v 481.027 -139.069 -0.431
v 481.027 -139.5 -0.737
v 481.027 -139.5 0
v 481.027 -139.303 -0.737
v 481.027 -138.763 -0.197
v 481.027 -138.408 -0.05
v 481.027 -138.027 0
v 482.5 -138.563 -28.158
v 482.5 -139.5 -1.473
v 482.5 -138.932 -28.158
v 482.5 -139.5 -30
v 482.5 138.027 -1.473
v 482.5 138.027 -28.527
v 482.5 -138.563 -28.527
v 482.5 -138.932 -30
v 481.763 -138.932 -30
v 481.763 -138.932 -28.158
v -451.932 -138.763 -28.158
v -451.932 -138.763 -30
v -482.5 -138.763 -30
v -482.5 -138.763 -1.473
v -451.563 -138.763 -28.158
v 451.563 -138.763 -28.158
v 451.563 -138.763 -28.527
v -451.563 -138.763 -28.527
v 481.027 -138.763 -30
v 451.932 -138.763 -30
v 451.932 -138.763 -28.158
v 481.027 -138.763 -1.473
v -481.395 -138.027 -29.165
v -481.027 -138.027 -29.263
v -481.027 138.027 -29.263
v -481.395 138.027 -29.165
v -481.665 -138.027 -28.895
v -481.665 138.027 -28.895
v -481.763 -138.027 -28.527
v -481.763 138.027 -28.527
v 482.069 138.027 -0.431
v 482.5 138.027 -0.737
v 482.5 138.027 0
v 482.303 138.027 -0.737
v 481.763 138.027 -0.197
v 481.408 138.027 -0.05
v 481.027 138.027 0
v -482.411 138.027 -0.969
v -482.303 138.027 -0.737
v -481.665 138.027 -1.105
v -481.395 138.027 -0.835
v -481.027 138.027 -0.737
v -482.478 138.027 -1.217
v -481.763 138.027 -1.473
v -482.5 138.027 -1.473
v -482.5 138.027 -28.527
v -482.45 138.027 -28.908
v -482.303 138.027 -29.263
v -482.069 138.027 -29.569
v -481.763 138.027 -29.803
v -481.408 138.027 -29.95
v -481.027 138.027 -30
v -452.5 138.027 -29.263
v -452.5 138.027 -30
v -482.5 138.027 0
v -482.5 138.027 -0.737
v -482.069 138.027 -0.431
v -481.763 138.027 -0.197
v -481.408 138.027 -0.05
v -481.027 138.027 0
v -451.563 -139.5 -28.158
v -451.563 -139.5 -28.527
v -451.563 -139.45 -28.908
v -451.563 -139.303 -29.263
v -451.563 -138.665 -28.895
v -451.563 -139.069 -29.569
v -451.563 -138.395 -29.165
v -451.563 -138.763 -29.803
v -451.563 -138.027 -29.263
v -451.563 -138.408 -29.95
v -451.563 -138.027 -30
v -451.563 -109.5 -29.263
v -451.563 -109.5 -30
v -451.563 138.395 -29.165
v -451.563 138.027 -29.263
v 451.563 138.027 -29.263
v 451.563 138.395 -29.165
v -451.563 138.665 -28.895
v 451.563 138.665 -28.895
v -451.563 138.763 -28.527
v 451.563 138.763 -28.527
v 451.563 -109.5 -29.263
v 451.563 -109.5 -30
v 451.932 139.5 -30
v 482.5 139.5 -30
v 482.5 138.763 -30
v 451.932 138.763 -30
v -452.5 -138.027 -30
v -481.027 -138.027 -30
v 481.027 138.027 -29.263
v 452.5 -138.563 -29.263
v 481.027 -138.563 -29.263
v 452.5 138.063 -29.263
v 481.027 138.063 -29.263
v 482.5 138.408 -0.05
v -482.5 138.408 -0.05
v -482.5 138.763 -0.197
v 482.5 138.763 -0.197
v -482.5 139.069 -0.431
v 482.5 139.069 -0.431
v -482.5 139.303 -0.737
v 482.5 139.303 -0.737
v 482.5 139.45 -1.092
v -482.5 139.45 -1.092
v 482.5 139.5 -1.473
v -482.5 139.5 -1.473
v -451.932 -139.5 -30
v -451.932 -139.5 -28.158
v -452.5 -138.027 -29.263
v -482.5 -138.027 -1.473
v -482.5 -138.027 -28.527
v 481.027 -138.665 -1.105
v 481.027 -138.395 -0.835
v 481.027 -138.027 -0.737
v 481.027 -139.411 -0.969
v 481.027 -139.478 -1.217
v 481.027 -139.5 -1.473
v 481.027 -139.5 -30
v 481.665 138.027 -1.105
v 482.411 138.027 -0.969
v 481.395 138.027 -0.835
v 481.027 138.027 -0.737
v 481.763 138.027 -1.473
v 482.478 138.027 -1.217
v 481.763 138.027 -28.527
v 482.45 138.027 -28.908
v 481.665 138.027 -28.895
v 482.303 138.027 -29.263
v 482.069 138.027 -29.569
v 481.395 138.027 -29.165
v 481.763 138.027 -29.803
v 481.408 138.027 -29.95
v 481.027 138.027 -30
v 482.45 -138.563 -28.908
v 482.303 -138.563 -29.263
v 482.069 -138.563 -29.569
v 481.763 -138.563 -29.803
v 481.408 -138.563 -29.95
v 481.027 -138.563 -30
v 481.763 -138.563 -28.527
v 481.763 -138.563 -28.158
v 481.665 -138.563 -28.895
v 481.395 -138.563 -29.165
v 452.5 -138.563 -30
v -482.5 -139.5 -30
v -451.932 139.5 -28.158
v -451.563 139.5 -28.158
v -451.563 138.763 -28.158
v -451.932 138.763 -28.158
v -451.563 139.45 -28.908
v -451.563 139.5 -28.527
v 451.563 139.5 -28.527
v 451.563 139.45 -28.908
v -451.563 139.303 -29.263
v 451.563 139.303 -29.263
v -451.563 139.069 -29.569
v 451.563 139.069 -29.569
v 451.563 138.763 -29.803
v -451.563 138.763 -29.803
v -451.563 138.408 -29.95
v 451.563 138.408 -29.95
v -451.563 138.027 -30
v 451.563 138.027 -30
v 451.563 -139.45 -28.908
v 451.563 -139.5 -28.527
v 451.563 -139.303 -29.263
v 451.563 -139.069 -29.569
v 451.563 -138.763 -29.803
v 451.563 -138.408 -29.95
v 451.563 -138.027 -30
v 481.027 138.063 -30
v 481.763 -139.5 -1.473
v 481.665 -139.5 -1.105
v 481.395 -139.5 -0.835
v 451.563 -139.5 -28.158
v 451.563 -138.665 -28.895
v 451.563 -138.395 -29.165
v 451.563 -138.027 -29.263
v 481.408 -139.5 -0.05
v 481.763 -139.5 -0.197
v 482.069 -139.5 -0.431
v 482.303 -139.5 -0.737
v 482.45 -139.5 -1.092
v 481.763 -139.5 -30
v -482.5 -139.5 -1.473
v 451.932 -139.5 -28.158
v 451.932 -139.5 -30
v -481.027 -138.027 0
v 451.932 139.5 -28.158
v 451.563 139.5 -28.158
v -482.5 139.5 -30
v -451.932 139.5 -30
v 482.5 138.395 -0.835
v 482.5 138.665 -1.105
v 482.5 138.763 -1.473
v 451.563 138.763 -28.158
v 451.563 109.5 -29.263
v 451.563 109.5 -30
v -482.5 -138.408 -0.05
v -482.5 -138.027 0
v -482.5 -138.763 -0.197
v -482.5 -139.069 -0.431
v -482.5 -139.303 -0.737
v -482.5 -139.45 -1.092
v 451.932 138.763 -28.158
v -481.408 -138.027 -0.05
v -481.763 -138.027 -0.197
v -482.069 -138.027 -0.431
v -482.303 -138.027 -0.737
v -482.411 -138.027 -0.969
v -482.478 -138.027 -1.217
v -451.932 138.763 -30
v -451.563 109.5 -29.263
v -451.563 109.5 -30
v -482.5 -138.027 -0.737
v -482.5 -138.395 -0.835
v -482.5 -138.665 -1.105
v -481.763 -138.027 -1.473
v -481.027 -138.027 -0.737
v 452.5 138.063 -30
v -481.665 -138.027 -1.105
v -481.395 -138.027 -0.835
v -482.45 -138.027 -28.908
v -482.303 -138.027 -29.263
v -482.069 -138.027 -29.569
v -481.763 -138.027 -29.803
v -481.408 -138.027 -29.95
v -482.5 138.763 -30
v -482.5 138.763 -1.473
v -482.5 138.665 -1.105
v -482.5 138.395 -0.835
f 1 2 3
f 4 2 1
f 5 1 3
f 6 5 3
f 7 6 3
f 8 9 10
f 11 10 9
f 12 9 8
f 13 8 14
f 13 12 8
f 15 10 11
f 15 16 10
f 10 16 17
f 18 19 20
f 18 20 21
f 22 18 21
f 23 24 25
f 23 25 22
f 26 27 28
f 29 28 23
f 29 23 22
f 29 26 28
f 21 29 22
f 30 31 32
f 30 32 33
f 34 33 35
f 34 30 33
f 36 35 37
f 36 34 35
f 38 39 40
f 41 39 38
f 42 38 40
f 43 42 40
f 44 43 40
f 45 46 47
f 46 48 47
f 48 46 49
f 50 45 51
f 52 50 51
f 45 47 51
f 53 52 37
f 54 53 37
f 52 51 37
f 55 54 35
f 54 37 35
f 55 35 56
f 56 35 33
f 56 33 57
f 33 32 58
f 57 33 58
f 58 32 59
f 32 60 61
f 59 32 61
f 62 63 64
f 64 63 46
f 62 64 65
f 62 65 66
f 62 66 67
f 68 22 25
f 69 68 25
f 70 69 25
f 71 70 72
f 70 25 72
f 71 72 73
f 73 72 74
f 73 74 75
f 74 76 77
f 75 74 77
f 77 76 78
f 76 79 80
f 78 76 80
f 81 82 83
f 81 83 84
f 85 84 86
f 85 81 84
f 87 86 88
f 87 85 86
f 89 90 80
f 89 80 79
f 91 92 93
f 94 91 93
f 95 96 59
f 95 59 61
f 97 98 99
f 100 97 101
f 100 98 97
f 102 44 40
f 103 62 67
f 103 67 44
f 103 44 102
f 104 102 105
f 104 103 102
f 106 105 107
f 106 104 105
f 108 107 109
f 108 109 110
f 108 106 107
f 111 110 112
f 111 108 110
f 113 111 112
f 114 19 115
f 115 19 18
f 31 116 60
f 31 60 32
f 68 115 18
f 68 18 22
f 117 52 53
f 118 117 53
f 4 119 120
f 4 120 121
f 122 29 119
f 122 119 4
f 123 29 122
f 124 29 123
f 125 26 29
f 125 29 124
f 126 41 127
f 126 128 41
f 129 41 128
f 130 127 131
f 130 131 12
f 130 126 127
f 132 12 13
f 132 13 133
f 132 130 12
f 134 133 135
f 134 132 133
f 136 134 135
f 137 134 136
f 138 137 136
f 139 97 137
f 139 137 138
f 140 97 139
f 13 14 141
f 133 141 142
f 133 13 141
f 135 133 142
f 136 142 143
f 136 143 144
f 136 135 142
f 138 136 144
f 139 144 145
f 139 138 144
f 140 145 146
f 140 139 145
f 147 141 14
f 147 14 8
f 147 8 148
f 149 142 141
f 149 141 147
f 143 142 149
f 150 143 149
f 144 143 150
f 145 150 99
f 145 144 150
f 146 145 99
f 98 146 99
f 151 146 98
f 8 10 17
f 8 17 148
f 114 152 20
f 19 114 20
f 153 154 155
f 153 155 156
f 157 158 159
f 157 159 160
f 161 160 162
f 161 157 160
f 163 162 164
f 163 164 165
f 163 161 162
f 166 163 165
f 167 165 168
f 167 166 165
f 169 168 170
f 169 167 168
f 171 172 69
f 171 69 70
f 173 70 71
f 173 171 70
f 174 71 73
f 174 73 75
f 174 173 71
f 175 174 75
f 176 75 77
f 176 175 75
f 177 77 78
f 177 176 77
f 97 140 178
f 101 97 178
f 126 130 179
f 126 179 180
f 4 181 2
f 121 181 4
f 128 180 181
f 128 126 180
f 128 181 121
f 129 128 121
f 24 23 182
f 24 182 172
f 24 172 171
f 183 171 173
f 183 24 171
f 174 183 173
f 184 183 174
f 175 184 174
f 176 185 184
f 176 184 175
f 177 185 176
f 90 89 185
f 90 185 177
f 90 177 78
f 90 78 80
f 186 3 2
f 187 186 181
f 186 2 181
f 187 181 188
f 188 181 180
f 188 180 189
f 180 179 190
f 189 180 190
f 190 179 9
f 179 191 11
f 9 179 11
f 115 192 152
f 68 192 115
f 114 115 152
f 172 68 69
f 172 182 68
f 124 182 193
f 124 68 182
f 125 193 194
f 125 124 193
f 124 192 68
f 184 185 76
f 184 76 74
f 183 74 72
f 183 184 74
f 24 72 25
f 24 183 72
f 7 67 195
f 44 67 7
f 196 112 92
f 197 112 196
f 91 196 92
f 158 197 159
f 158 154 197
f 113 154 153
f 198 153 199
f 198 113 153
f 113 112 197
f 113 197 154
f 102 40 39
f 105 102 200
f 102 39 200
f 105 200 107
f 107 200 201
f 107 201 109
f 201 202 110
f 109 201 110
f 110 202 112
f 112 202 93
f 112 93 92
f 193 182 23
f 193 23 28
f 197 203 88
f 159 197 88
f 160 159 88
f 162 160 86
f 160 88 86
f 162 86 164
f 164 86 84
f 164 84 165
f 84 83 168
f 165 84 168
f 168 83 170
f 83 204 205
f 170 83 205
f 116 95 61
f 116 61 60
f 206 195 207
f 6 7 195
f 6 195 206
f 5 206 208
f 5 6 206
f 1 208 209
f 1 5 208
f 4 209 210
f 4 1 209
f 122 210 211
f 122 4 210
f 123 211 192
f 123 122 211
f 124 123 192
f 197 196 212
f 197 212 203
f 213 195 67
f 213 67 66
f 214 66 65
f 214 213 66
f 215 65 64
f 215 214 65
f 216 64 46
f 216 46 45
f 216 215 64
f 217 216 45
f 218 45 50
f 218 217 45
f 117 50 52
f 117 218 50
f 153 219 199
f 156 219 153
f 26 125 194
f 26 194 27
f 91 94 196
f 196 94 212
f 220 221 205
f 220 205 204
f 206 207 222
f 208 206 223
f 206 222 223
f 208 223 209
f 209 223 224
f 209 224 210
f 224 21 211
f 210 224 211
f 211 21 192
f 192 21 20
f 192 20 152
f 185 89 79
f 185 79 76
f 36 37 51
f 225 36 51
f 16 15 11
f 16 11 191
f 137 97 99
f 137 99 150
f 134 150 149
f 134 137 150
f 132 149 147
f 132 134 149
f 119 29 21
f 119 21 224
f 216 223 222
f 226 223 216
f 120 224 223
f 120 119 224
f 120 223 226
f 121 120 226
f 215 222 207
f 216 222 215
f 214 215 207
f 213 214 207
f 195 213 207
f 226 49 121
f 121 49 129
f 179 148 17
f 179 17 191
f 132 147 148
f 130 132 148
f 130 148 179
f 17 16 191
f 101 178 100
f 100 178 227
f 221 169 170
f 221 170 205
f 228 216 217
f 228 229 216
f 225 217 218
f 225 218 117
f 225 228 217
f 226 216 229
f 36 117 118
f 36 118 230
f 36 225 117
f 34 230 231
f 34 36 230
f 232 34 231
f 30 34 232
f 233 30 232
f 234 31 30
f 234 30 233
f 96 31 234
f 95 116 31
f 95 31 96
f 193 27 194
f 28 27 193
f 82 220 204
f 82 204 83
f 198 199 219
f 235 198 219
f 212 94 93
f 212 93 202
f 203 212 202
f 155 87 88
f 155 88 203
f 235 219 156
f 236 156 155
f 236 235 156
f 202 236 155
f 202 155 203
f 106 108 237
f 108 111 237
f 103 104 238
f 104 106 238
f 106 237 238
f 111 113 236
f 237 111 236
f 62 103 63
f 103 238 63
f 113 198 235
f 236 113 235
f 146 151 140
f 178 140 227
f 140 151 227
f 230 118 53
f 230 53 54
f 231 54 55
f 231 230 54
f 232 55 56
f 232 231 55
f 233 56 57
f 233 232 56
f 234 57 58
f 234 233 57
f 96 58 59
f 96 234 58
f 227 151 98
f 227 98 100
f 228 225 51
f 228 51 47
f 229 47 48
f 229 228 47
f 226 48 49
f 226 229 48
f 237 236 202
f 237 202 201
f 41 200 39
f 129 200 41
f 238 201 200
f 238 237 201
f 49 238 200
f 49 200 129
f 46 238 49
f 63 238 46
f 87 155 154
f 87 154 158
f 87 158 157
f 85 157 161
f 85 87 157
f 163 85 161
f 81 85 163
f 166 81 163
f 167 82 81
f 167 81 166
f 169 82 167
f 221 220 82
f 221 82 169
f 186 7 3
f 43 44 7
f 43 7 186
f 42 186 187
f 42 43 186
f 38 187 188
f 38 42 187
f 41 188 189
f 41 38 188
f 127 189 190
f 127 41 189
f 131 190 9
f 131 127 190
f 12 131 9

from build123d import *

# Parameters (mm, degrees)
SKETCH1_W                     = 965
SKETCH1_H                     = 279
BASE_FLANGE1_DEPTH            = 0.7366
EDGE_FLANGE1_STRIP_W          = 4.4196
EDGE_FLANGE1_STRIP_H          = 0.7366
EDGE_FLANGE1_STRIP_CUT_DEPTH  = 965
EDGE_FLANGE1_DEPTH            = 965
EDGE_FLANGE2_STRIP_W          = 4.4196
EDGE_FLANGE2_STRIP_H          = 0.7366
EDGE_FLANGE2_STRIP_CUT_DEPTH  = 277.5268
EDGE_FLANGE2_DEPTH            = 277.5268
EDGE_FLANGE3_STRIP_W          = 4.4196
EDGE_FLANGE3_STRIP_H          = 0.7366
EDGE_FLANGE3_STRIP_CUT_DEPTH  = 963.5268
EDGE_FLANGE3_DEPTH            = 963.5268
EDGE_FLANGE4_STRIP_W          = 4.4196
EDGE_FLANGE4_STRIP_H          = 0.7366
EDGE_FLANGE4_STRIP_CUT_DEPTH  = 276.0536
EDGE_FLANGE4_DEPTH            = 276.0536
EDGE_FLANGE5_STRIP_W          = 4.4196
EDGE_FLANGE5_STRIP_H          = 0.7366
EDGE_FLANGE5_STRIP_CUT_DEPTH  = 903.1268
EDGE_FLANGE5_RELIEF_W         = 4.7879
EDGE_FLANGE5_RELIEF_H         = 0.3683
EDGE_FLANGE5_RELIEF_CUT_DEPTH = 0.7366
EDGE_FLANGE5_DEPTH            = 903.1268
EDGE_FLANGE6_STRIP_W          = 4.4196
EDGE_FLANGE6_STRIP_H          = 0.7366
EDGE_FLANGE6_STRIP_CUT_DEPTH  = 903.1268
EDGE_FLANGE6_RELIEF_W         = 4.7879
EDGE_FLANGE6_RELIEF_H         = 0.3683
EDGE_FLANGE6_RELIEF_CUT_DEPTH = 0.7366
EDGE_FLANGE6_DEPTH            = 903.1268
EDGE_FLANGE7_STRIP_W          = 4.4196
EDGE_FLANGE7_STRIP_H          = 0.7366
EDGE_FLANGE7_STRIP_CUT_DEPTH  = 276.5902
EDGE_FLANGE7_RELIEF_W         = 4.7879
EDGE_FLANGE7_RELIEF_H         = 0.3683
EDGE_FLANGE7_RELIEF_CUT_DEPTH = 0.7366
EDGE_FLANGE7_DEPTH            = 276.5902
EDGE_FLANGE7_PROFILE_W        = 276.6268
EDGE_FLANGE7_PROFILE_H        = 28.5268
EDGE_FLANGE7_FLAT_DEPTH       = 0.7366
EDGE_FLANGE8_STRIP_W          = 4.4196
EDGE_FLANGE8_STRIP_H          = 0.7366
EDGE_FLANGE8_STRIP_CUT_DEPTH  = 276.0536
EDGE_FLANGE8_DEPTH            = 276.0536


# Sheet-metal steps are written as plain solids
with BuildPart() as part:
    # Sketch1 → Base-Flange1 (new body)
    with BuildSketch(Plane.XY):
        Rectangle(SKETCH1_W, SKETCH1_H)
    extrude(amount=-BASE_FLANGE1_DEPTH)

    # Edge-Flange1 strip (across the edge) → Edge-Flange1 strip cut (cut)
    with BuildSketch(Plane(origin=(-482.5, 139.5, -0.7366), x_dir=(0, -1, 0), z_dir=(1, 0, 0))):
        with Locations((-0.7366, -0.3683)):
            Rectangle(EDGE_FLANGE1_STRIP_W, EDGE_FLANGE1_STRIP_H)
    extrude(amount=EDGE_FLANGE1_STRIP_CUT_DEPTH, mode=Mode.SUBTRACT)

    # Edge-Flange1 section (across the edge) → Edge-Flange1 (add)
    with BuildSketch(Plane(origin=(-482.5, 139.5, -0.7366), x_dir=(0, -1, 0), z_dir=(1, 0, 0))):
        with BuildLine():
            Line((0, 0.7366), (0, 29.2634))
            Line((0, 29.2634), (0.7366, 29.2634))
            Line((0.7366, 29.2634), (0.7366, 0.7366))
            ThreePointArc((0.7366, 0.7366), (0.952345145, 0.215745145), (1.4732, 0))
            Line((1.4732, 0), (1.4732, -0.7366))
            ThreePointArc((1.4732, -0.7366), (0.43149029, -0.30510971), (0, 0.7366))
        make_face()
    extrude(amount=EDGE_FLANGE1_DEPTH)

    # Edge-Flange2 strip (across the edge) → Edge-Flange2 strip cut (cut)
    with BuildSketch(Plane(origin=(482.5, 138.0268, -0.7366), x_dir=(-1, 0, 0), z_dir=(0, -1, 0))):
        with Locations((-0.7366, -0.3683)):
            Rectangle(EDGE_FLANGE2_STRIP_W, EDGE_FLANGE2_STRIP_H)
    extrude(amount=EDGE_FLANGE2_STRIP_CUT_DEPTH, mode=Mode.SUBTRACT)

    # Edge-Flange2 section (across the edge) → Edge-Flange2 (add)
    with BuildSketch(Plane(origin=(482.5, 138.0268, -0.7366), x_dir=(-1, 0, 0), z_dir=(0, -1, 0))):
        with BuildLine():
            Line((0, 0.7366), (0, 29.2634))
            Line((0, 29.2634), (0.7366, 29.2634))
            Line((0.7366, 29.2634), (0.7366, 0.7366))
            ThreePointArc((0.7366, 0.7366), (0.952345145, 0.215745145), (1.4732, 0))
            Line((1.4732, 0), (1.4732, -0.7366))
            ThreePointArc((1.4732, -0.7366), (0.43149029, -0.30510971), (0, 0.7366))
        make_face()
    extrude(amount=EDGE_FLANGE2_DEPTH)

    # Edge-Flange3 strip (across the edge) → Edge-Flange3 strip cut (cut)
    with BuildSketch(Plane(origin=(481.0268, -139.5, -0.7366), x_dir=(0, 1, 0), z_dir=(-1, 0, 0))):
        with Locations((-0.7366, -0.3683)):
            Rectangle(EDGE_FLANGE3_STRIP_W, EDGE_FLANGE3_STRIP_H)
    extrude(amount=EDGE_FLANGE3_STRIP_CUT_DEPTH, mode=Mode.SUBTRACT)

    # Edge-Flange3 section (across the edge) → Edge-Flange3 (add)
    with BuildSketch(Plane(origin=(481.0268, -139.5, -0.7366), x_dir=(0, 1, 0), z_dir=(-1, 0, 0))):
        with BuildLine():
            Line((0, 0.7366), (0, 29.2634))
            Line((0, 29.2634), (0.7366, 29.2634))
            Line((0.7366, 29.2634), (0.7366, 0.7366))
            ThreePointArc((0.7366, 0.7366), (0.952345145, 0.215745145), (1.4732, 0))
            Line((1.4732, 0), (1.4732, -0.7366))
            ThreePointArc((1.4732, -0.7366), (0.43149029, -0.30510971), (0, 0.7366))
        make_face()
    extrude(amount=EDGE_FLANGE3_DEPTH)

    # Edge-Flange4 strip (across the edge) → Edge-Flange4 strip cut (cut)
    with BuildSketch(Plane(origin=(-482.5, -138.0268, -0.7366), x_dir=(1, 0, 0), z_dir=(0, 1, 0))):
        with Locations((-0.7366, -0.3683)):
            Rectangle(EDGE_FLANGE4_STRIP_W, EDGE_FLANGE4_STRIP_H)
    extrude(amount=EDGE_FLANGE4_STRIP_CUT_DEPTH, mode=Mode.SUBTRACT)

    # Edge-Flange4 section (across the edge) → Edge-Flange4 (add)
    with BuildSketch(Plane(origin=(-482.5, -138.0268, -0.7366), x_dir=(1, 0, 0), z_dir=(0, 1, 0))):
        with BuildLine():
            Line((0, 0.7366), (0, 29.2634))
            Line((0, 29.2634), (0.7366, 29.2634))
            Line((0.7366, 29.2634), (0.7366, 0.7366))
            ThreePointArc((0.7366, 0.7366), (0.952345145, 0.215745145), (1.4732, 0))
            Line((1.4732, 0), (1.4732, -0.7366))
            ThreePointArc((1.4732, -0.7366), (0.43149029, -0.30510971), (0, 0.7366))
        make_face()
    extrude(amount=EDGE_FLANGE4_DEPTH)

    # Edge-Flange5 strip (across the edge) → Edge-Flange5 strip cut (cut)
    with BuildSketch(Plane(origin=(451.5634, -138.7634, -30), x_dir=(0, 0, 1), z_dir=(-1, 0, 0))):
        with Locations((-0.7366, -0.3683)):
            Rectangle(EDGE_FLANGE5_STRIP_W, EDGE_FLANGE5_STRIP_H)
    extrude(amount=EDGE_FLANGE5_STRIP_CUT_DEPTH, mode=Mode.SUBTRACT)

    # Edge-Flange5 relief (on the sheet) → Edge-Flange5 relief cut (cut)
    with BuildSketch(Plane(origin=(451.5634, -138.7634, -28.5268), x_dir=(0, 0, 1), z_dir=(0, 1, 0))):
        with Locations((-2.02565, 0.18415)):
            Rectangle(EDGE_FLANGE5_RELIEF_W, EDGE_FLANGE5_RELIEF_H)
        with Locations((-2.02565, -903.31095)):
            Rectangle(EDGE_FLANGE5_RELIEF_W, EDGE_FLANGE5_RELIEF_H)
    extrude(amount=-EDGE_FLANGE5_RELIEF_CUT_DEPTH, mode=Mode.SUBTRACT)

    # Edge-Flange5 section (across the edge) → Edge-Flange5 (add)
    with BuildSketch(Plane(origin=(451.5634, -138.7634, -30), x_dir=(0, 0, 1), z_dir=(-1, 0, 0))):
        with BuildLine():
            Line((0, 0.7366), (0, 29.2634))
            Line((0, 29.2634), (0.7366, 29.2634))
            Line((0.7366, 29.2634), (0.7366, 0.7366))
            ThreePointArc((0.7366, 0.7366), (0.952345145, 0.215745145), (1.4732, 0))
            Line((1.4732, 0), (1.4732, -0.7366))
            ThreePointArc((1.4732, -0.7366), (0.43149029, -0.30510971), (0, 0.7366))
        make_face()
    extrude(amount=EDGE_FLANGE5_DEPTH)

    # Edge-Flange6 strip (across the edge) → Edge-Flange6 strip cut (cut)
    with BuildSketch(Plane(origin=(-451.5634, 138.7634, -30), x_dir=(0, 0, 1), z_dir=(1, 0, 0))):
        with Locations((-0.7366, -0.3683)):
            Rectangle(EDGE_FLANGE6_STRIP_W, EDGE_FLANGE6_STRIP_H)
    extrude(amount=EDGE_FLANGE6_STRIP_CUT_DEPTH, mode=Mode.SUBTRACT)

    # Edge-Flange6 relief (on the sheet) → Edge-Flange6 relief cut (cut)
    with BuildSketch(Plane(origin=(-451.5634, 138.7634, -28.5268), x_dir=(0, 0, 1), z_dir=(0, -1, 0))):
        with Locations((-2.02565, 0.18415)):
            Rectangle(EDGE_FLANGE6_RELIEF_W, EDGE_FLANGE6_RELIEF_H)
        with Locations((-2.02565, -903.31095)):
            Rectangle(EDGE_FLANGE6_RELIEF_W, EDGE_FLANGE6_RELIEF_H)
    extrude(amount=-EDGE_FLANGE6_RELIEF_CUT_DEPTH, mode=Mode.SUBTRACT)

    # Edge-Flange6 section (across the edge) → Edge-Flange6 (add)
    with BuildSketch(Plane(origin=(-451.5634, 138.7634, -30), x_dir=(0, 0, 1), z_dir=(1, 0, 0))):
        with BuildLine():
            Line((0, 0.7366), (0, 29.2634))
            Line((0, 29.2634), (0.7366, 29.2634))
            Line((0.7366, 29.2634), (0.7366, 0.7366))
            ThreePointArc((0.7366, 0.7366), (0.952345145, 0.215745145), (1.4732, 0))
            Line((1.4732, 0), (1.4732, -0.7366))
            ThreePointArc((1.4732, -0.7366), (0.43149029, -0.30510971), (0, 0.7366))
        make_face()
    extrude(amount=EDGE_FLANGE6_DEPTH)

    # Edge-Flange7 strip (across the edge) → Edge-Flange7 strip cut (cut)
    with BuildSketch(Plane(origin=(481.7634, 138.0268, -30), x_dir=(0, 0, 1), z_dir=(0, -1, 0))):
        with Locations((-0.7366, -0.3683)):
            Rectangle(EDGE_FLANGE7_STRIP_W, EDGE_FLANGE7_STRIP_H)
    extrude(amount=EDGE_FLANGE7_STRIP_CUT_DEPTH, mode=Mode.SUBTRACT)

    # Edge-Flange7 relief (on the sheet) → Edge-Flange7 relief cut (cut)
    with BuildSketch(Plane(origin=(481.7634, 138.0268, -28.5268), x_dir=(0, 0, 1), z_dir=(-1, 0, 0))):
        with Locations((-2.02565, -276.77435)):
            Rectangle(EDGE_FLANGE7_RELIEF_W, EDGE_FLANGE7_RELIEF_H)
    extrude(amount=-EDGE_FLANGE7_RELIEF_CUT_DEPTH, mode=Mode.SUBTRACT)

    # Edge-Flange7 bend section (across the edge) → Edge-Flange7 (add)
    with BuildSketch(Plane(origin=(481.7634, 138.0268, -30), x_dir=(0, 0, 1), z_dir=(0, -1, 0))):
        with BuildLine():
            Line((0, 0.7366), (0.7366, 0.7366))
            ThreePointArc((0.7366, 0.7366), (0.952345145, 0.215745145), (1.4732, 0))
            Line((1.4732, 0), (1.4732, -0.7366))
            ThreePointArc((1.4732, -0.7366), (0.43149029, -0.30510971), (0, 0.7366))
        make_face()
    extrude(amount=EDGE_FLANGE7_DEPTH)

    # Edge-Flange7 profile (on flange) → Edge-Flange7 flat (add)
    with BuildSketch(Plane(origin=(481.7634, 0, -30), x_dir=(0, 1, 0), z_dir=(0, 0, 1))):
        with Locations((-0.25, 15)):
            Rectangle(EDGE_FLANGE7_PROFILE_W, EDGE_FLANGE7_PROFILE_H)
    extrude(amount=EDGE_FLANGE7_FLAT_DEPTH)

    # Edge-Flange8 strip (across the edge) → Edge-Flange8 strip cut (cut)
    with BuildSketch(Plane(origin=(-481.7634, -138.0268, -30), x_dir=(0, 0, 1), z_dir=(0, 1, 0))):
        with Locations((-0.7366, -0.3683)):
            Rectangle(EDGE_FLANGE8_STRIP_W, EDGE_FLANGE8_STRIP_H)
    extrude(amount=EDGE_FLANGE8_STRIP_CUT_DEPTH, mode=Mode.SUBTRACT)

    # Edge-Flange8 section (across the edge) → Edge-Flange8 (add)
    with BuildSketch(Plane(origin=(-481.7634, -138.0268, -30), x_dir=(0, 0, 1), z_dir=(0, 1, 0))):
        with BuildLine():
            Line((0, 0.7366), (0, 29.2634))
            Line((0, 29.2634), (0.7366, 29.2634))
            Line((0.7366, 29.2634), (0.7366, 0.7366))
            ThreePointArc((0.7366, 0.7366), (0.952345145, 0.215745145), (1.4732, 0))
            Line((1.4732, 0), (1.4732, -0.7366))
            ThreePointArc((1.4732, -0.7366), (0.43149029, -0.30510971), (0, 0.7366))
        make_face()
    extrude(amount=EDGE_FLANGE8_DEPTH)


solid = part.part
